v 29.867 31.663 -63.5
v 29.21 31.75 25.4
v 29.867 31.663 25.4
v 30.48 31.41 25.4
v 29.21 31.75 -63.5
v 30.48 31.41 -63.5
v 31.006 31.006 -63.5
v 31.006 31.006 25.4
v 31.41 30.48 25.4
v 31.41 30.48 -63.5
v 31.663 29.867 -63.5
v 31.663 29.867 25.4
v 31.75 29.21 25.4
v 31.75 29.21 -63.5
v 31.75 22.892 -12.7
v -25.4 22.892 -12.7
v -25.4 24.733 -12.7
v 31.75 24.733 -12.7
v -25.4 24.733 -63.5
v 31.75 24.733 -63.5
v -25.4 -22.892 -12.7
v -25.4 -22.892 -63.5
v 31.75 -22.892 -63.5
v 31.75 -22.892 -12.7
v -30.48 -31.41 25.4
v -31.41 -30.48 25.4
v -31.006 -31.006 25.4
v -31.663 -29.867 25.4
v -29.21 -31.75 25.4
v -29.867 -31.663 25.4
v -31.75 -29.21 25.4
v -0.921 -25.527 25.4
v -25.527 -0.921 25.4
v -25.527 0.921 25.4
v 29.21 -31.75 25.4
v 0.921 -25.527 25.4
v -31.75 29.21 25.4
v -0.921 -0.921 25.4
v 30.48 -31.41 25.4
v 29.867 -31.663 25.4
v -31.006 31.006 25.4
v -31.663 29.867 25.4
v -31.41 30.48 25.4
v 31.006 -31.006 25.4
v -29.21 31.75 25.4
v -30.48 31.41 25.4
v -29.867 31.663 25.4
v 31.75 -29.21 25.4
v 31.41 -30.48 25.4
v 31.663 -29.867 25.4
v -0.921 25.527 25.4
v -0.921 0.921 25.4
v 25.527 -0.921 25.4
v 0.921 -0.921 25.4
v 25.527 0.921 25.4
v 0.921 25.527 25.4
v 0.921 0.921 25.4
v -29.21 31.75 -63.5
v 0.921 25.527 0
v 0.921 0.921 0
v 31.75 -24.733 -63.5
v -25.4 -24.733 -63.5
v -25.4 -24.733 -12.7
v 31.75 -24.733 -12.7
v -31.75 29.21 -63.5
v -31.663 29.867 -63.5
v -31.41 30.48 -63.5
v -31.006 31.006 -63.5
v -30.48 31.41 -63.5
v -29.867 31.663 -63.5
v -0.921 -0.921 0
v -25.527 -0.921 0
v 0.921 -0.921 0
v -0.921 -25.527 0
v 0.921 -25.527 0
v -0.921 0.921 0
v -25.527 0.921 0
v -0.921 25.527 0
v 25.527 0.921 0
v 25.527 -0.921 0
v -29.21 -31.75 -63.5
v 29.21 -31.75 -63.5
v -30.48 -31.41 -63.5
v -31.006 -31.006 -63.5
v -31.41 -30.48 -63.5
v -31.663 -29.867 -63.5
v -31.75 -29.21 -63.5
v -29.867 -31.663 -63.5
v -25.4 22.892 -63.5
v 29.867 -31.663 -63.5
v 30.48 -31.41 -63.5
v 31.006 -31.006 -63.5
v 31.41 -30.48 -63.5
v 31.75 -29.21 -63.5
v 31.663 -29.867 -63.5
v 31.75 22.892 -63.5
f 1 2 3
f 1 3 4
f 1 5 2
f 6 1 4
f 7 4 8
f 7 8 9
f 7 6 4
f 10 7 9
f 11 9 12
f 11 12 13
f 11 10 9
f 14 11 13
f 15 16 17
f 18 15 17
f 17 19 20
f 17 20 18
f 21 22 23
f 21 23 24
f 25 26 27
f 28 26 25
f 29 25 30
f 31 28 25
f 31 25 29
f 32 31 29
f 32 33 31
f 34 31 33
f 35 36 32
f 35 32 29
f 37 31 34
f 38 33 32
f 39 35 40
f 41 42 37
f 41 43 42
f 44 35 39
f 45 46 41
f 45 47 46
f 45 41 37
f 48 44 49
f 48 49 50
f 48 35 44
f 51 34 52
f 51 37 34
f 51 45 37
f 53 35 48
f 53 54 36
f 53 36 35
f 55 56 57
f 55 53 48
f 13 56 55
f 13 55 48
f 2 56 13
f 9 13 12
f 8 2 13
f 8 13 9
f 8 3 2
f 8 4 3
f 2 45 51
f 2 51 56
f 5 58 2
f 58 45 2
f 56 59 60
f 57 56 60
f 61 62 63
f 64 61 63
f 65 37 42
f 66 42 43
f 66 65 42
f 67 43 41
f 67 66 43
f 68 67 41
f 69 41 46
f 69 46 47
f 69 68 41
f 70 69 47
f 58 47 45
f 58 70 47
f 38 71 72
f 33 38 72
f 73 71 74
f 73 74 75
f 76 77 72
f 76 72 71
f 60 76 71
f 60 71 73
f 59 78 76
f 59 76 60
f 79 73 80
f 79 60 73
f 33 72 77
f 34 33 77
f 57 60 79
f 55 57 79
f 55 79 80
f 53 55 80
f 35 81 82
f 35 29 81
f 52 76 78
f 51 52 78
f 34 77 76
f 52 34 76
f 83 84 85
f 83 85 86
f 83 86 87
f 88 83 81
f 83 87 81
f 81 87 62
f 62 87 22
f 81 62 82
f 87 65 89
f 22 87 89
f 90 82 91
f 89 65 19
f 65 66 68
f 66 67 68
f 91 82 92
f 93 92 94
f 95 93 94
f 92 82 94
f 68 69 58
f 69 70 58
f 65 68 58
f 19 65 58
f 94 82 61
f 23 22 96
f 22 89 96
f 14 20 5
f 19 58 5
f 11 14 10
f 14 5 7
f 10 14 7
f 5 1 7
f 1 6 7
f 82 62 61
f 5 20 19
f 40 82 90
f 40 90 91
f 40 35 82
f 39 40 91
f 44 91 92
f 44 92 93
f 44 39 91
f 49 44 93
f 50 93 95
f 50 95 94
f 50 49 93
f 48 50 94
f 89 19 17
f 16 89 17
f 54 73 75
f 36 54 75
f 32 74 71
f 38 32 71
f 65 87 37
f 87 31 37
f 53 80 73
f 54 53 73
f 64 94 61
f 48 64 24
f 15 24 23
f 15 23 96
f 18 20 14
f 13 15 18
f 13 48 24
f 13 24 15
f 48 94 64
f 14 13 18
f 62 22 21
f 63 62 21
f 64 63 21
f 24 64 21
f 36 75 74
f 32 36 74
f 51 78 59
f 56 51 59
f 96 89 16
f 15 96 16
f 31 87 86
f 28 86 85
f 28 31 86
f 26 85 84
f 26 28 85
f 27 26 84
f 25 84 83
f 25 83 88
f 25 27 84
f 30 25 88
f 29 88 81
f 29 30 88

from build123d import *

# Parameters (mm, degrees)
SKETCH1_W           = 63.5
SKETCH1_H           = 63.5
BOSS_EXTRUDE1_DEPTH = 25.4
SKETCH1_7_W         = 63.5
SKETCH1_7_H         = 63.5
SKETCH1_7_W_2       = 24.60625
SKETCH1_7_H_2       = 1.8415
SKETCH1_7_W_3       = 1.8415
SKETCH1_7_H_3       = 24.60625
BOSS_EXTRUDE2_DEPTH = 63.5
CUT_EXTRUDE1_START  = -6.35
SKETCH2_W           = 50.8
SKETCH2_H           = 1.8415
CUT_EXTRUDE1_DEPTH  = 89.9
FILLET1_R           = 2.54


with BuildPart() as part:
    # Sketch1 → Boss-Extrude1 (new body)
    with BuildSketch(Plane.XY):
        Rectangle(SKETCH1_W, SKETCH1_H)
        Polygon((-0.92075, -0.92075), (-25.527, -0.92075), (-25.527, 0.92075), (-0.92075, 0.92075), (-0.92075, 25.527), (0.92075, 25.527), (0.92075, 0.92075), (25.527, 0.92075), (25.527, -0.92075), (0.92075, -0.92075), (0.92075, -25.527), (-0.92075, -25.527), align=None, mode=Mode.SUBTRACT)
    extrude(amount=BOSS_EXTRUDE1_DEPTH)

    # Sketch1<7> → Boss-Extrude2 (add)
    # profile 1 of 6: a face of its own
    with BuildSketch(Plane.XY):
        Rectangle(SKETCH1_7_W, SKETCH1_7_H)
        Polygon((-0.92075, -0.92075), (-25.527, -0.92075), (-25.527, 0.92075), (-0.92075, 0.92075), (-0.92075, 25.527), (0.92075, 25.527), (0.92075, 0.92075), (25.527, 0.92075), (25.527, -0.92075), (0.92075, -0.92075), (0.92075, -25.527), (-0.92075, -25.527), align=None, mode=Mode.SUBTRACT)
    # profile 2 of 6: a face of its own
    with BuildSketch(Plane.XY):
        with Locations((-13.223875, 0)):
            Rectangle(SKETCH1_7_W_2, SKETCH1_7_H_2)
    # profile 3 of 6: a face of its own
    with BuildSketch(Plane.XY):
        with Locations((13.223875, 0)):
            Rectangle(SKETCH1_7_W_2, SKETCH1_7_H_2)
    # profile 4 of 6: a face of its own
    with BuildSketch(Plane.XY):
        with Locations((0, -13.223875)):
            Rectangle(SKETCH1_7_W_3, SKETCH1_7_H_3)
    # profile 5 of 6: a face of its own
    with BuildSketch(Plane.XY):
        with Locations((0, 13.223875)):
            Rectangle(SKETCH1_7_W_3, SKETCH1_7_H_3)
    # profile 6 of 6: a face of its own
    with BuildSketch(Plane.XY):
        Rectangle(SKETCH1_7_W_3, SKETCH1_7_H_2)
    extrude(amount=-BOSS_EXTRUDE2_DEPTH)

    # Sketch2 → Cut-Extrude1 (cut, through all)
    with BuildSketch(Plane.ZY.offset(31.75).offset(CUT_EXTRUDE1_START)):
        with Locations((-38.1, 23.8125)):
            Rectangle(SKETCH2_W, SKETCH2_H)
        with Locations((-38.1, -23.8125)):
            Rectangle(SKETCH2_W, SKETCH2_H)
    extrude(amount=-CUT_EXTRUDE1_DEPTH, mode=Mode.SUBTRACT)

    # Fillet1
    fillet1_edges = [part.edges().sort_by_distance(p)[0] for p in [
        (31.75, 31.75, -19.05),
        (31.75, -31.75, -19.05),
        (-31.75, -31.75, -19.05),
        (-31.75, 31.75, -19.05),
    ]]
    fillet(fillet1_edges, radius=FILLET1_R)


solid = part.part
